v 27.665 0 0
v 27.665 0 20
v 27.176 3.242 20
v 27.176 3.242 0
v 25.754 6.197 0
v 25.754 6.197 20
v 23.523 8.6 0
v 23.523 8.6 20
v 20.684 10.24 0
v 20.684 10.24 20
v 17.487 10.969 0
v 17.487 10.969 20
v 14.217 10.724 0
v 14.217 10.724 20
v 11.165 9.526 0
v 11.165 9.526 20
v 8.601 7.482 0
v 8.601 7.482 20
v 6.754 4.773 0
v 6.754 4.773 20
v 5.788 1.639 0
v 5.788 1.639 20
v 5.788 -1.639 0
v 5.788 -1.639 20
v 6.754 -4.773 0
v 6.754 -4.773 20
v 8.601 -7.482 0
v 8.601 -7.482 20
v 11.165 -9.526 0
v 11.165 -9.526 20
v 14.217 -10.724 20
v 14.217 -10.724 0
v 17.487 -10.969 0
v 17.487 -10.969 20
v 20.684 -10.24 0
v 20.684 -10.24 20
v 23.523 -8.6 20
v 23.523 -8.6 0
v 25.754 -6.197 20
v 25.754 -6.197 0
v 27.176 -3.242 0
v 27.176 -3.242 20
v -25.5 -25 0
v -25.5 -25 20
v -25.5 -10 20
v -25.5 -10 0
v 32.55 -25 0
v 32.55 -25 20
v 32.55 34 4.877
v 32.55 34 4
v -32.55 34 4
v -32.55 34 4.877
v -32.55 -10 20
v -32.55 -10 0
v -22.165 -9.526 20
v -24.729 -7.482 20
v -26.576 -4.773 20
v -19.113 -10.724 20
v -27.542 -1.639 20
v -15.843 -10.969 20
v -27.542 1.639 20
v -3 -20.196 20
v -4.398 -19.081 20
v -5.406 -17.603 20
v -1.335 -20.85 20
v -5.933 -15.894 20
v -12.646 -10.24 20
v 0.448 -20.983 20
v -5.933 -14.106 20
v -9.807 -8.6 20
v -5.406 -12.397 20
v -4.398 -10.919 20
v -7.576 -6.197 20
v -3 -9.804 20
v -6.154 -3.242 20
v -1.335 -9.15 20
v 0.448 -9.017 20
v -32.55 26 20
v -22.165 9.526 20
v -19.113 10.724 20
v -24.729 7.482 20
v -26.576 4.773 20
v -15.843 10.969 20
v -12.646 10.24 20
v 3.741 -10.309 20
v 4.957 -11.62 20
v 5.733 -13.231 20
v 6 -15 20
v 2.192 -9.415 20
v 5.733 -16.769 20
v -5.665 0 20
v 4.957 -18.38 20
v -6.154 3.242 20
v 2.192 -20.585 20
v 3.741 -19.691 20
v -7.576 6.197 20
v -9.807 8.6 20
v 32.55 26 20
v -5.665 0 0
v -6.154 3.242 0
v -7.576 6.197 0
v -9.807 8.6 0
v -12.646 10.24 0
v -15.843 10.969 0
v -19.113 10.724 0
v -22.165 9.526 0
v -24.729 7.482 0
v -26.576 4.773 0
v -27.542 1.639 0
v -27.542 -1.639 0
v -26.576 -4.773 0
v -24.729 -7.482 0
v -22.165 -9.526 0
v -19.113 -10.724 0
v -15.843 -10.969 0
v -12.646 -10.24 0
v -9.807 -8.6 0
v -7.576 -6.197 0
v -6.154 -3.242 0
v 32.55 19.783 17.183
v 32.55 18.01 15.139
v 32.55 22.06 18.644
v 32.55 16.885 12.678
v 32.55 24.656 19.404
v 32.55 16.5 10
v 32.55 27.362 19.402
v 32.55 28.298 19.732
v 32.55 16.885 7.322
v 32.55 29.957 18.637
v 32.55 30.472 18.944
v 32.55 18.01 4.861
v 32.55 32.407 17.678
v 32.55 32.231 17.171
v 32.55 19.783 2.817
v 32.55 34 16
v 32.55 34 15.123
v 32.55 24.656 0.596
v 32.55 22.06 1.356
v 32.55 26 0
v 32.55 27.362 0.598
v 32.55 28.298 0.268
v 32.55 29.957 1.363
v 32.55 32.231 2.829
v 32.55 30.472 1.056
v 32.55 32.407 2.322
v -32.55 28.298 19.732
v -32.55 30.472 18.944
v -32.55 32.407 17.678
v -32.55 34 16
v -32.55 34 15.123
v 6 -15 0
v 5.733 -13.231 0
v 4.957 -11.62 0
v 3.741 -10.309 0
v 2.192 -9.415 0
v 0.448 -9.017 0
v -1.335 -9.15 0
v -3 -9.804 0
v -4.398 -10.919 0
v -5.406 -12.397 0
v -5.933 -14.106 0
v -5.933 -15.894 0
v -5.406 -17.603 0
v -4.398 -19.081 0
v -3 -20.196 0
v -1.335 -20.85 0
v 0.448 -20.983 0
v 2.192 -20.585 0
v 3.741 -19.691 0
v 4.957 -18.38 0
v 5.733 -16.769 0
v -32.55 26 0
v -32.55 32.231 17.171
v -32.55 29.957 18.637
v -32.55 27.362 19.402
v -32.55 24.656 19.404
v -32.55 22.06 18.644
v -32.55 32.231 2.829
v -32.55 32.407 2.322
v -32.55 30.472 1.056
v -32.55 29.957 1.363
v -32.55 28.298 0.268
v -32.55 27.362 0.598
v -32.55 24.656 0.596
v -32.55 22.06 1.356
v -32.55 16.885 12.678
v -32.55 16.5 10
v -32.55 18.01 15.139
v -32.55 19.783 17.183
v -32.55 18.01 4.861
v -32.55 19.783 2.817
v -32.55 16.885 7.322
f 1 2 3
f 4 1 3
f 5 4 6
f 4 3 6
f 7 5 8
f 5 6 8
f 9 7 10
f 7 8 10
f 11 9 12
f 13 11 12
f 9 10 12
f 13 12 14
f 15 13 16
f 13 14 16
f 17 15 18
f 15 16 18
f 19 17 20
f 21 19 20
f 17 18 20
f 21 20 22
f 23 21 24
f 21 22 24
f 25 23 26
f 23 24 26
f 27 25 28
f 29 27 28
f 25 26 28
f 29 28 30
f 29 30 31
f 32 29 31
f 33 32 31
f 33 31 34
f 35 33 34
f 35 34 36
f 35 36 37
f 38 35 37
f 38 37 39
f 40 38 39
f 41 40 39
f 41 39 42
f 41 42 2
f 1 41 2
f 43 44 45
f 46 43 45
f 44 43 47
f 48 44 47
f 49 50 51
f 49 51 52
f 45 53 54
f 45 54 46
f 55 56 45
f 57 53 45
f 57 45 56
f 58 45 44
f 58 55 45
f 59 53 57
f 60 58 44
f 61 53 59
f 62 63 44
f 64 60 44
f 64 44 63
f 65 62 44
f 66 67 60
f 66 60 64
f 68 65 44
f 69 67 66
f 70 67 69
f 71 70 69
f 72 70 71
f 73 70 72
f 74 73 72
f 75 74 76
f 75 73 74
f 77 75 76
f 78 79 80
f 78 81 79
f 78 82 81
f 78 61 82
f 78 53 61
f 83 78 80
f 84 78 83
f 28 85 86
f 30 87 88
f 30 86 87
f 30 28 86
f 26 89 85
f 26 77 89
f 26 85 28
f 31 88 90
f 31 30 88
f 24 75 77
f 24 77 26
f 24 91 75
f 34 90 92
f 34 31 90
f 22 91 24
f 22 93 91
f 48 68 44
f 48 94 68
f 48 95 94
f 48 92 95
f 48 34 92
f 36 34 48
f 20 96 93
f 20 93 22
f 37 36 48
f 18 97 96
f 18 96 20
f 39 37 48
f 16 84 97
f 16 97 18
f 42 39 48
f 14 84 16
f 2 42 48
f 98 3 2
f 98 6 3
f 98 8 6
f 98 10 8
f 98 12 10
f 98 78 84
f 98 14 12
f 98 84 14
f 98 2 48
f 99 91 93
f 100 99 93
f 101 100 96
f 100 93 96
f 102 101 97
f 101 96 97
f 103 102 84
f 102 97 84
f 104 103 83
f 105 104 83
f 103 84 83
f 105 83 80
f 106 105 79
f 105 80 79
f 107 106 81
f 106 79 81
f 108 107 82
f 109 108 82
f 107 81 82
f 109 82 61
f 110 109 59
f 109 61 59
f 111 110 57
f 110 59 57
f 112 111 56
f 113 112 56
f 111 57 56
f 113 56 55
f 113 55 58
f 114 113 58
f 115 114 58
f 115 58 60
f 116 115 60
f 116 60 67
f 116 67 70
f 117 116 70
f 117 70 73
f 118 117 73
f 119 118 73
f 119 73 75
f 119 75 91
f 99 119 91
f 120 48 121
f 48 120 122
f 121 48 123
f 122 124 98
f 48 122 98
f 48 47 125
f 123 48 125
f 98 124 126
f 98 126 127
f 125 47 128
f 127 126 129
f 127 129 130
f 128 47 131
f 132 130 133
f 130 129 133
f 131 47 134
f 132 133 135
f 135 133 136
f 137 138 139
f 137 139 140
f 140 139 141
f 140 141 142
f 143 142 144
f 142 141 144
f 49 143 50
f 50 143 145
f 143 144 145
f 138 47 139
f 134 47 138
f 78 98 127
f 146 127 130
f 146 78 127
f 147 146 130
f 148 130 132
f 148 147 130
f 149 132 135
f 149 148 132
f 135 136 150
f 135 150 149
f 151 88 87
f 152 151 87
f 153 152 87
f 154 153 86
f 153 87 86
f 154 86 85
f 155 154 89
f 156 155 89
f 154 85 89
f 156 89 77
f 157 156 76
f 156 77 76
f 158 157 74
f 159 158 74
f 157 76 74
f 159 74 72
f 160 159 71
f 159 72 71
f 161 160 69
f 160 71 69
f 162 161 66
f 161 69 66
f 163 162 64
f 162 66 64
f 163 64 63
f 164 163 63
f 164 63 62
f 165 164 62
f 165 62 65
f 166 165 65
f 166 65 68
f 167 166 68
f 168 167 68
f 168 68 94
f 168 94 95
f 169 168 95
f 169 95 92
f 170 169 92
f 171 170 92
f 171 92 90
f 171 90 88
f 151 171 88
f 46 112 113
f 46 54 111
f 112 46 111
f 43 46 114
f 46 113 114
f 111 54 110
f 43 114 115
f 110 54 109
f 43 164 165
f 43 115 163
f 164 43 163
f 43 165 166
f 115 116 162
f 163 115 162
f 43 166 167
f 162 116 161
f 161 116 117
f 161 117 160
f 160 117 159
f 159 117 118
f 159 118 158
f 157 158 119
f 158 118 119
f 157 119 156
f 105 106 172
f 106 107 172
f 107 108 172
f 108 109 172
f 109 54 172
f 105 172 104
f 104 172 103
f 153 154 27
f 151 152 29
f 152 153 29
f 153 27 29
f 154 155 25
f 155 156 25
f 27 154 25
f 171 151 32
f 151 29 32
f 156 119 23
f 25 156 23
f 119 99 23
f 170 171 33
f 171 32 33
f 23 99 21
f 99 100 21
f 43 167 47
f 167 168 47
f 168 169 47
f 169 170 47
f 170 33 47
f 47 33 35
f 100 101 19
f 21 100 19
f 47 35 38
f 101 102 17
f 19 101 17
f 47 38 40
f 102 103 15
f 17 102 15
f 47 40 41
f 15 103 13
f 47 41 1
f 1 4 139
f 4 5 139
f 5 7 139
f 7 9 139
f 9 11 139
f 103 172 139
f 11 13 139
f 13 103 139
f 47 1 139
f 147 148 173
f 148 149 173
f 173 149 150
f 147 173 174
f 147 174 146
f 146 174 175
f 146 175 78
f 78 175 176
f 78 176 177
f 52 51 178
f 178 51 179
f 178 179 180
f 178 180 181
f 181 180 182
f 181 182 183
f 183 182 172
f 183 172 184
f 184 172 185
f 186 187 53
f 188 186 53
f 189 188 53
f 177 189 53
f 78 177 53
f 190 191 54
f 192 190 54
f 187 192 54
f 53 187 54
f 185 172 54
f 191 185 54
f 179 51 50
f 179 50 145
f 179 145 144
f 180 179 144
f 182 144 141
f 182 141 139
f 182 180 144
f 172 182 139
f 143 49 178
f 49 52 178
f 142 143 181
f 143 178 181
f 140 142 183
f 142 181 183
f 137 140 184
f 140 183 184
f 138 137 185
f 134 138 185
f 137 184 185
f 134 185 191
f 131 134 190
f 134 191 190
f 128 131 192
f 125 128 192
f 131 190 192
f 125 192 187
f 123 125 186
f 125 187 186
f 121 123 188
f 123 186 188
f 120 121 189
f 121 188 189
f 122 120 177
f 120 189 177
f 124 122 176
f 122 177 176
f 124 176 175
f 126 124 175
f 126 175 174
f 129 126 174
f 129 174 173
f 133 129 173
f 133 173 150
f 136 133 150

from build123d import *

# Parameters (mm, degrees)
PARALLELEPIPEDOBLOCCO_DEPTH      = 20
SCHIZZO2_R                       = 11
SCHIZZO2_R_2                     = 6
FORITUBIMOTORI_DEPTH             = 54.183667606
SCHIZZO4_R                       = 9.5
FOROLONGHERONE_DEPTH             = 78.504903071
ELIMINAZIONEPARTESUPERIORE_DEPTH = 78.504903071
SCHIZZO6_W                       = 7.05
SCHIZZO6_H                       = 15
SPAZIOMOVIMENTOLEVETTA_DEPTH     = 53.49288047
SCHIZZO7_W                       = 20
SCHIZZO7_H                       = 2
RIMOZIONEPARTESUPERIORE_DEPTH    = 65.1


with BuildPart() as part:
    # Schizzo1 → ParallelepipedoBlocco (new body)
    with BuildSketch(Plane.XY):
        Polygon((-30.55, -25), (30.55, -25), (32.55, -25), (32.55, 17), (32.55, 37), (-32.55, 37), (-32.55, 17), (-32.55, -25), align=None)
    extrude(amount=PARALLELEPIPEDOBLOCCO_DEPTH)

    # Schizzo2 → ForiTubiMotori (cut, through all)
    with BuildSketch(Plane.XY.offset(20)):
        with Locations((-16.665, 0)):
            Circle(SCHIZZO2_R)
        with Locations((16.665, 0)):
            Circle(SCHIZZO2_R)
        with Locations((0, -15)):
            Circle(SCHIZZO2_R_2)
    extrude(amount=-FORITUBIMOTORI_DEPTH, mode=Mode.SUBTRACT)

    # Schizzo4 → ForoLongherone (cut, through all)
    with BuildSketch(Plane.ZY.offset(32.55)):
        with Locations((10, 26)):
            Circle(SCHIZZO4_R)
    extrude(amount=-FOROLONGHERONE_DEPTH, mode=Mode.SUBTRACT)

    # Schizzo5 → EliminazioneParteSuperiore (cut, through all)
    with BuildSketch(Plane.ZY.offset(32.55)):
        with BuildLine():
            Line((0, 26), (0, 37))
            Line((0, 37), (20, 37))
            Line((20, 37), (20, 26))
            ThreePointArc((20, 26), (10, 36), (0, 26))
        make_face()
    extrude(amount=-ELIMINAZIONEPARTESUPERIORE_DEPTH, mode=Mode.SUBTRACT)

    # Schizzo6 → SpazioMovimentoLevetta (cut, through all)
    with BuildSketch(Plane.XY.offset(20)):
        with Locations((-29.025, -17.5)):
            Rectangle(SCHIZZO6_W, SCHIZZO6_H)
    extrude(amount=-SPAZIOMOVIMENTOLEVETTA_DEPTH, mode=Mode.SUBTRACT)

    # Schizzo7 → RimozioneParteSuperiore (cut)
    with BuildSketch(Plane.ZY.offset(32.55)):
        with Locations((10, 35)):
            Rectangle(SCHIZZO7_W, SCHIZZO7_H)
    extrude(amount=-RIMOZIONEPARTESUPERIORE_DEPTH, mode=Mode.SUBTRACT)


solid = part.part
